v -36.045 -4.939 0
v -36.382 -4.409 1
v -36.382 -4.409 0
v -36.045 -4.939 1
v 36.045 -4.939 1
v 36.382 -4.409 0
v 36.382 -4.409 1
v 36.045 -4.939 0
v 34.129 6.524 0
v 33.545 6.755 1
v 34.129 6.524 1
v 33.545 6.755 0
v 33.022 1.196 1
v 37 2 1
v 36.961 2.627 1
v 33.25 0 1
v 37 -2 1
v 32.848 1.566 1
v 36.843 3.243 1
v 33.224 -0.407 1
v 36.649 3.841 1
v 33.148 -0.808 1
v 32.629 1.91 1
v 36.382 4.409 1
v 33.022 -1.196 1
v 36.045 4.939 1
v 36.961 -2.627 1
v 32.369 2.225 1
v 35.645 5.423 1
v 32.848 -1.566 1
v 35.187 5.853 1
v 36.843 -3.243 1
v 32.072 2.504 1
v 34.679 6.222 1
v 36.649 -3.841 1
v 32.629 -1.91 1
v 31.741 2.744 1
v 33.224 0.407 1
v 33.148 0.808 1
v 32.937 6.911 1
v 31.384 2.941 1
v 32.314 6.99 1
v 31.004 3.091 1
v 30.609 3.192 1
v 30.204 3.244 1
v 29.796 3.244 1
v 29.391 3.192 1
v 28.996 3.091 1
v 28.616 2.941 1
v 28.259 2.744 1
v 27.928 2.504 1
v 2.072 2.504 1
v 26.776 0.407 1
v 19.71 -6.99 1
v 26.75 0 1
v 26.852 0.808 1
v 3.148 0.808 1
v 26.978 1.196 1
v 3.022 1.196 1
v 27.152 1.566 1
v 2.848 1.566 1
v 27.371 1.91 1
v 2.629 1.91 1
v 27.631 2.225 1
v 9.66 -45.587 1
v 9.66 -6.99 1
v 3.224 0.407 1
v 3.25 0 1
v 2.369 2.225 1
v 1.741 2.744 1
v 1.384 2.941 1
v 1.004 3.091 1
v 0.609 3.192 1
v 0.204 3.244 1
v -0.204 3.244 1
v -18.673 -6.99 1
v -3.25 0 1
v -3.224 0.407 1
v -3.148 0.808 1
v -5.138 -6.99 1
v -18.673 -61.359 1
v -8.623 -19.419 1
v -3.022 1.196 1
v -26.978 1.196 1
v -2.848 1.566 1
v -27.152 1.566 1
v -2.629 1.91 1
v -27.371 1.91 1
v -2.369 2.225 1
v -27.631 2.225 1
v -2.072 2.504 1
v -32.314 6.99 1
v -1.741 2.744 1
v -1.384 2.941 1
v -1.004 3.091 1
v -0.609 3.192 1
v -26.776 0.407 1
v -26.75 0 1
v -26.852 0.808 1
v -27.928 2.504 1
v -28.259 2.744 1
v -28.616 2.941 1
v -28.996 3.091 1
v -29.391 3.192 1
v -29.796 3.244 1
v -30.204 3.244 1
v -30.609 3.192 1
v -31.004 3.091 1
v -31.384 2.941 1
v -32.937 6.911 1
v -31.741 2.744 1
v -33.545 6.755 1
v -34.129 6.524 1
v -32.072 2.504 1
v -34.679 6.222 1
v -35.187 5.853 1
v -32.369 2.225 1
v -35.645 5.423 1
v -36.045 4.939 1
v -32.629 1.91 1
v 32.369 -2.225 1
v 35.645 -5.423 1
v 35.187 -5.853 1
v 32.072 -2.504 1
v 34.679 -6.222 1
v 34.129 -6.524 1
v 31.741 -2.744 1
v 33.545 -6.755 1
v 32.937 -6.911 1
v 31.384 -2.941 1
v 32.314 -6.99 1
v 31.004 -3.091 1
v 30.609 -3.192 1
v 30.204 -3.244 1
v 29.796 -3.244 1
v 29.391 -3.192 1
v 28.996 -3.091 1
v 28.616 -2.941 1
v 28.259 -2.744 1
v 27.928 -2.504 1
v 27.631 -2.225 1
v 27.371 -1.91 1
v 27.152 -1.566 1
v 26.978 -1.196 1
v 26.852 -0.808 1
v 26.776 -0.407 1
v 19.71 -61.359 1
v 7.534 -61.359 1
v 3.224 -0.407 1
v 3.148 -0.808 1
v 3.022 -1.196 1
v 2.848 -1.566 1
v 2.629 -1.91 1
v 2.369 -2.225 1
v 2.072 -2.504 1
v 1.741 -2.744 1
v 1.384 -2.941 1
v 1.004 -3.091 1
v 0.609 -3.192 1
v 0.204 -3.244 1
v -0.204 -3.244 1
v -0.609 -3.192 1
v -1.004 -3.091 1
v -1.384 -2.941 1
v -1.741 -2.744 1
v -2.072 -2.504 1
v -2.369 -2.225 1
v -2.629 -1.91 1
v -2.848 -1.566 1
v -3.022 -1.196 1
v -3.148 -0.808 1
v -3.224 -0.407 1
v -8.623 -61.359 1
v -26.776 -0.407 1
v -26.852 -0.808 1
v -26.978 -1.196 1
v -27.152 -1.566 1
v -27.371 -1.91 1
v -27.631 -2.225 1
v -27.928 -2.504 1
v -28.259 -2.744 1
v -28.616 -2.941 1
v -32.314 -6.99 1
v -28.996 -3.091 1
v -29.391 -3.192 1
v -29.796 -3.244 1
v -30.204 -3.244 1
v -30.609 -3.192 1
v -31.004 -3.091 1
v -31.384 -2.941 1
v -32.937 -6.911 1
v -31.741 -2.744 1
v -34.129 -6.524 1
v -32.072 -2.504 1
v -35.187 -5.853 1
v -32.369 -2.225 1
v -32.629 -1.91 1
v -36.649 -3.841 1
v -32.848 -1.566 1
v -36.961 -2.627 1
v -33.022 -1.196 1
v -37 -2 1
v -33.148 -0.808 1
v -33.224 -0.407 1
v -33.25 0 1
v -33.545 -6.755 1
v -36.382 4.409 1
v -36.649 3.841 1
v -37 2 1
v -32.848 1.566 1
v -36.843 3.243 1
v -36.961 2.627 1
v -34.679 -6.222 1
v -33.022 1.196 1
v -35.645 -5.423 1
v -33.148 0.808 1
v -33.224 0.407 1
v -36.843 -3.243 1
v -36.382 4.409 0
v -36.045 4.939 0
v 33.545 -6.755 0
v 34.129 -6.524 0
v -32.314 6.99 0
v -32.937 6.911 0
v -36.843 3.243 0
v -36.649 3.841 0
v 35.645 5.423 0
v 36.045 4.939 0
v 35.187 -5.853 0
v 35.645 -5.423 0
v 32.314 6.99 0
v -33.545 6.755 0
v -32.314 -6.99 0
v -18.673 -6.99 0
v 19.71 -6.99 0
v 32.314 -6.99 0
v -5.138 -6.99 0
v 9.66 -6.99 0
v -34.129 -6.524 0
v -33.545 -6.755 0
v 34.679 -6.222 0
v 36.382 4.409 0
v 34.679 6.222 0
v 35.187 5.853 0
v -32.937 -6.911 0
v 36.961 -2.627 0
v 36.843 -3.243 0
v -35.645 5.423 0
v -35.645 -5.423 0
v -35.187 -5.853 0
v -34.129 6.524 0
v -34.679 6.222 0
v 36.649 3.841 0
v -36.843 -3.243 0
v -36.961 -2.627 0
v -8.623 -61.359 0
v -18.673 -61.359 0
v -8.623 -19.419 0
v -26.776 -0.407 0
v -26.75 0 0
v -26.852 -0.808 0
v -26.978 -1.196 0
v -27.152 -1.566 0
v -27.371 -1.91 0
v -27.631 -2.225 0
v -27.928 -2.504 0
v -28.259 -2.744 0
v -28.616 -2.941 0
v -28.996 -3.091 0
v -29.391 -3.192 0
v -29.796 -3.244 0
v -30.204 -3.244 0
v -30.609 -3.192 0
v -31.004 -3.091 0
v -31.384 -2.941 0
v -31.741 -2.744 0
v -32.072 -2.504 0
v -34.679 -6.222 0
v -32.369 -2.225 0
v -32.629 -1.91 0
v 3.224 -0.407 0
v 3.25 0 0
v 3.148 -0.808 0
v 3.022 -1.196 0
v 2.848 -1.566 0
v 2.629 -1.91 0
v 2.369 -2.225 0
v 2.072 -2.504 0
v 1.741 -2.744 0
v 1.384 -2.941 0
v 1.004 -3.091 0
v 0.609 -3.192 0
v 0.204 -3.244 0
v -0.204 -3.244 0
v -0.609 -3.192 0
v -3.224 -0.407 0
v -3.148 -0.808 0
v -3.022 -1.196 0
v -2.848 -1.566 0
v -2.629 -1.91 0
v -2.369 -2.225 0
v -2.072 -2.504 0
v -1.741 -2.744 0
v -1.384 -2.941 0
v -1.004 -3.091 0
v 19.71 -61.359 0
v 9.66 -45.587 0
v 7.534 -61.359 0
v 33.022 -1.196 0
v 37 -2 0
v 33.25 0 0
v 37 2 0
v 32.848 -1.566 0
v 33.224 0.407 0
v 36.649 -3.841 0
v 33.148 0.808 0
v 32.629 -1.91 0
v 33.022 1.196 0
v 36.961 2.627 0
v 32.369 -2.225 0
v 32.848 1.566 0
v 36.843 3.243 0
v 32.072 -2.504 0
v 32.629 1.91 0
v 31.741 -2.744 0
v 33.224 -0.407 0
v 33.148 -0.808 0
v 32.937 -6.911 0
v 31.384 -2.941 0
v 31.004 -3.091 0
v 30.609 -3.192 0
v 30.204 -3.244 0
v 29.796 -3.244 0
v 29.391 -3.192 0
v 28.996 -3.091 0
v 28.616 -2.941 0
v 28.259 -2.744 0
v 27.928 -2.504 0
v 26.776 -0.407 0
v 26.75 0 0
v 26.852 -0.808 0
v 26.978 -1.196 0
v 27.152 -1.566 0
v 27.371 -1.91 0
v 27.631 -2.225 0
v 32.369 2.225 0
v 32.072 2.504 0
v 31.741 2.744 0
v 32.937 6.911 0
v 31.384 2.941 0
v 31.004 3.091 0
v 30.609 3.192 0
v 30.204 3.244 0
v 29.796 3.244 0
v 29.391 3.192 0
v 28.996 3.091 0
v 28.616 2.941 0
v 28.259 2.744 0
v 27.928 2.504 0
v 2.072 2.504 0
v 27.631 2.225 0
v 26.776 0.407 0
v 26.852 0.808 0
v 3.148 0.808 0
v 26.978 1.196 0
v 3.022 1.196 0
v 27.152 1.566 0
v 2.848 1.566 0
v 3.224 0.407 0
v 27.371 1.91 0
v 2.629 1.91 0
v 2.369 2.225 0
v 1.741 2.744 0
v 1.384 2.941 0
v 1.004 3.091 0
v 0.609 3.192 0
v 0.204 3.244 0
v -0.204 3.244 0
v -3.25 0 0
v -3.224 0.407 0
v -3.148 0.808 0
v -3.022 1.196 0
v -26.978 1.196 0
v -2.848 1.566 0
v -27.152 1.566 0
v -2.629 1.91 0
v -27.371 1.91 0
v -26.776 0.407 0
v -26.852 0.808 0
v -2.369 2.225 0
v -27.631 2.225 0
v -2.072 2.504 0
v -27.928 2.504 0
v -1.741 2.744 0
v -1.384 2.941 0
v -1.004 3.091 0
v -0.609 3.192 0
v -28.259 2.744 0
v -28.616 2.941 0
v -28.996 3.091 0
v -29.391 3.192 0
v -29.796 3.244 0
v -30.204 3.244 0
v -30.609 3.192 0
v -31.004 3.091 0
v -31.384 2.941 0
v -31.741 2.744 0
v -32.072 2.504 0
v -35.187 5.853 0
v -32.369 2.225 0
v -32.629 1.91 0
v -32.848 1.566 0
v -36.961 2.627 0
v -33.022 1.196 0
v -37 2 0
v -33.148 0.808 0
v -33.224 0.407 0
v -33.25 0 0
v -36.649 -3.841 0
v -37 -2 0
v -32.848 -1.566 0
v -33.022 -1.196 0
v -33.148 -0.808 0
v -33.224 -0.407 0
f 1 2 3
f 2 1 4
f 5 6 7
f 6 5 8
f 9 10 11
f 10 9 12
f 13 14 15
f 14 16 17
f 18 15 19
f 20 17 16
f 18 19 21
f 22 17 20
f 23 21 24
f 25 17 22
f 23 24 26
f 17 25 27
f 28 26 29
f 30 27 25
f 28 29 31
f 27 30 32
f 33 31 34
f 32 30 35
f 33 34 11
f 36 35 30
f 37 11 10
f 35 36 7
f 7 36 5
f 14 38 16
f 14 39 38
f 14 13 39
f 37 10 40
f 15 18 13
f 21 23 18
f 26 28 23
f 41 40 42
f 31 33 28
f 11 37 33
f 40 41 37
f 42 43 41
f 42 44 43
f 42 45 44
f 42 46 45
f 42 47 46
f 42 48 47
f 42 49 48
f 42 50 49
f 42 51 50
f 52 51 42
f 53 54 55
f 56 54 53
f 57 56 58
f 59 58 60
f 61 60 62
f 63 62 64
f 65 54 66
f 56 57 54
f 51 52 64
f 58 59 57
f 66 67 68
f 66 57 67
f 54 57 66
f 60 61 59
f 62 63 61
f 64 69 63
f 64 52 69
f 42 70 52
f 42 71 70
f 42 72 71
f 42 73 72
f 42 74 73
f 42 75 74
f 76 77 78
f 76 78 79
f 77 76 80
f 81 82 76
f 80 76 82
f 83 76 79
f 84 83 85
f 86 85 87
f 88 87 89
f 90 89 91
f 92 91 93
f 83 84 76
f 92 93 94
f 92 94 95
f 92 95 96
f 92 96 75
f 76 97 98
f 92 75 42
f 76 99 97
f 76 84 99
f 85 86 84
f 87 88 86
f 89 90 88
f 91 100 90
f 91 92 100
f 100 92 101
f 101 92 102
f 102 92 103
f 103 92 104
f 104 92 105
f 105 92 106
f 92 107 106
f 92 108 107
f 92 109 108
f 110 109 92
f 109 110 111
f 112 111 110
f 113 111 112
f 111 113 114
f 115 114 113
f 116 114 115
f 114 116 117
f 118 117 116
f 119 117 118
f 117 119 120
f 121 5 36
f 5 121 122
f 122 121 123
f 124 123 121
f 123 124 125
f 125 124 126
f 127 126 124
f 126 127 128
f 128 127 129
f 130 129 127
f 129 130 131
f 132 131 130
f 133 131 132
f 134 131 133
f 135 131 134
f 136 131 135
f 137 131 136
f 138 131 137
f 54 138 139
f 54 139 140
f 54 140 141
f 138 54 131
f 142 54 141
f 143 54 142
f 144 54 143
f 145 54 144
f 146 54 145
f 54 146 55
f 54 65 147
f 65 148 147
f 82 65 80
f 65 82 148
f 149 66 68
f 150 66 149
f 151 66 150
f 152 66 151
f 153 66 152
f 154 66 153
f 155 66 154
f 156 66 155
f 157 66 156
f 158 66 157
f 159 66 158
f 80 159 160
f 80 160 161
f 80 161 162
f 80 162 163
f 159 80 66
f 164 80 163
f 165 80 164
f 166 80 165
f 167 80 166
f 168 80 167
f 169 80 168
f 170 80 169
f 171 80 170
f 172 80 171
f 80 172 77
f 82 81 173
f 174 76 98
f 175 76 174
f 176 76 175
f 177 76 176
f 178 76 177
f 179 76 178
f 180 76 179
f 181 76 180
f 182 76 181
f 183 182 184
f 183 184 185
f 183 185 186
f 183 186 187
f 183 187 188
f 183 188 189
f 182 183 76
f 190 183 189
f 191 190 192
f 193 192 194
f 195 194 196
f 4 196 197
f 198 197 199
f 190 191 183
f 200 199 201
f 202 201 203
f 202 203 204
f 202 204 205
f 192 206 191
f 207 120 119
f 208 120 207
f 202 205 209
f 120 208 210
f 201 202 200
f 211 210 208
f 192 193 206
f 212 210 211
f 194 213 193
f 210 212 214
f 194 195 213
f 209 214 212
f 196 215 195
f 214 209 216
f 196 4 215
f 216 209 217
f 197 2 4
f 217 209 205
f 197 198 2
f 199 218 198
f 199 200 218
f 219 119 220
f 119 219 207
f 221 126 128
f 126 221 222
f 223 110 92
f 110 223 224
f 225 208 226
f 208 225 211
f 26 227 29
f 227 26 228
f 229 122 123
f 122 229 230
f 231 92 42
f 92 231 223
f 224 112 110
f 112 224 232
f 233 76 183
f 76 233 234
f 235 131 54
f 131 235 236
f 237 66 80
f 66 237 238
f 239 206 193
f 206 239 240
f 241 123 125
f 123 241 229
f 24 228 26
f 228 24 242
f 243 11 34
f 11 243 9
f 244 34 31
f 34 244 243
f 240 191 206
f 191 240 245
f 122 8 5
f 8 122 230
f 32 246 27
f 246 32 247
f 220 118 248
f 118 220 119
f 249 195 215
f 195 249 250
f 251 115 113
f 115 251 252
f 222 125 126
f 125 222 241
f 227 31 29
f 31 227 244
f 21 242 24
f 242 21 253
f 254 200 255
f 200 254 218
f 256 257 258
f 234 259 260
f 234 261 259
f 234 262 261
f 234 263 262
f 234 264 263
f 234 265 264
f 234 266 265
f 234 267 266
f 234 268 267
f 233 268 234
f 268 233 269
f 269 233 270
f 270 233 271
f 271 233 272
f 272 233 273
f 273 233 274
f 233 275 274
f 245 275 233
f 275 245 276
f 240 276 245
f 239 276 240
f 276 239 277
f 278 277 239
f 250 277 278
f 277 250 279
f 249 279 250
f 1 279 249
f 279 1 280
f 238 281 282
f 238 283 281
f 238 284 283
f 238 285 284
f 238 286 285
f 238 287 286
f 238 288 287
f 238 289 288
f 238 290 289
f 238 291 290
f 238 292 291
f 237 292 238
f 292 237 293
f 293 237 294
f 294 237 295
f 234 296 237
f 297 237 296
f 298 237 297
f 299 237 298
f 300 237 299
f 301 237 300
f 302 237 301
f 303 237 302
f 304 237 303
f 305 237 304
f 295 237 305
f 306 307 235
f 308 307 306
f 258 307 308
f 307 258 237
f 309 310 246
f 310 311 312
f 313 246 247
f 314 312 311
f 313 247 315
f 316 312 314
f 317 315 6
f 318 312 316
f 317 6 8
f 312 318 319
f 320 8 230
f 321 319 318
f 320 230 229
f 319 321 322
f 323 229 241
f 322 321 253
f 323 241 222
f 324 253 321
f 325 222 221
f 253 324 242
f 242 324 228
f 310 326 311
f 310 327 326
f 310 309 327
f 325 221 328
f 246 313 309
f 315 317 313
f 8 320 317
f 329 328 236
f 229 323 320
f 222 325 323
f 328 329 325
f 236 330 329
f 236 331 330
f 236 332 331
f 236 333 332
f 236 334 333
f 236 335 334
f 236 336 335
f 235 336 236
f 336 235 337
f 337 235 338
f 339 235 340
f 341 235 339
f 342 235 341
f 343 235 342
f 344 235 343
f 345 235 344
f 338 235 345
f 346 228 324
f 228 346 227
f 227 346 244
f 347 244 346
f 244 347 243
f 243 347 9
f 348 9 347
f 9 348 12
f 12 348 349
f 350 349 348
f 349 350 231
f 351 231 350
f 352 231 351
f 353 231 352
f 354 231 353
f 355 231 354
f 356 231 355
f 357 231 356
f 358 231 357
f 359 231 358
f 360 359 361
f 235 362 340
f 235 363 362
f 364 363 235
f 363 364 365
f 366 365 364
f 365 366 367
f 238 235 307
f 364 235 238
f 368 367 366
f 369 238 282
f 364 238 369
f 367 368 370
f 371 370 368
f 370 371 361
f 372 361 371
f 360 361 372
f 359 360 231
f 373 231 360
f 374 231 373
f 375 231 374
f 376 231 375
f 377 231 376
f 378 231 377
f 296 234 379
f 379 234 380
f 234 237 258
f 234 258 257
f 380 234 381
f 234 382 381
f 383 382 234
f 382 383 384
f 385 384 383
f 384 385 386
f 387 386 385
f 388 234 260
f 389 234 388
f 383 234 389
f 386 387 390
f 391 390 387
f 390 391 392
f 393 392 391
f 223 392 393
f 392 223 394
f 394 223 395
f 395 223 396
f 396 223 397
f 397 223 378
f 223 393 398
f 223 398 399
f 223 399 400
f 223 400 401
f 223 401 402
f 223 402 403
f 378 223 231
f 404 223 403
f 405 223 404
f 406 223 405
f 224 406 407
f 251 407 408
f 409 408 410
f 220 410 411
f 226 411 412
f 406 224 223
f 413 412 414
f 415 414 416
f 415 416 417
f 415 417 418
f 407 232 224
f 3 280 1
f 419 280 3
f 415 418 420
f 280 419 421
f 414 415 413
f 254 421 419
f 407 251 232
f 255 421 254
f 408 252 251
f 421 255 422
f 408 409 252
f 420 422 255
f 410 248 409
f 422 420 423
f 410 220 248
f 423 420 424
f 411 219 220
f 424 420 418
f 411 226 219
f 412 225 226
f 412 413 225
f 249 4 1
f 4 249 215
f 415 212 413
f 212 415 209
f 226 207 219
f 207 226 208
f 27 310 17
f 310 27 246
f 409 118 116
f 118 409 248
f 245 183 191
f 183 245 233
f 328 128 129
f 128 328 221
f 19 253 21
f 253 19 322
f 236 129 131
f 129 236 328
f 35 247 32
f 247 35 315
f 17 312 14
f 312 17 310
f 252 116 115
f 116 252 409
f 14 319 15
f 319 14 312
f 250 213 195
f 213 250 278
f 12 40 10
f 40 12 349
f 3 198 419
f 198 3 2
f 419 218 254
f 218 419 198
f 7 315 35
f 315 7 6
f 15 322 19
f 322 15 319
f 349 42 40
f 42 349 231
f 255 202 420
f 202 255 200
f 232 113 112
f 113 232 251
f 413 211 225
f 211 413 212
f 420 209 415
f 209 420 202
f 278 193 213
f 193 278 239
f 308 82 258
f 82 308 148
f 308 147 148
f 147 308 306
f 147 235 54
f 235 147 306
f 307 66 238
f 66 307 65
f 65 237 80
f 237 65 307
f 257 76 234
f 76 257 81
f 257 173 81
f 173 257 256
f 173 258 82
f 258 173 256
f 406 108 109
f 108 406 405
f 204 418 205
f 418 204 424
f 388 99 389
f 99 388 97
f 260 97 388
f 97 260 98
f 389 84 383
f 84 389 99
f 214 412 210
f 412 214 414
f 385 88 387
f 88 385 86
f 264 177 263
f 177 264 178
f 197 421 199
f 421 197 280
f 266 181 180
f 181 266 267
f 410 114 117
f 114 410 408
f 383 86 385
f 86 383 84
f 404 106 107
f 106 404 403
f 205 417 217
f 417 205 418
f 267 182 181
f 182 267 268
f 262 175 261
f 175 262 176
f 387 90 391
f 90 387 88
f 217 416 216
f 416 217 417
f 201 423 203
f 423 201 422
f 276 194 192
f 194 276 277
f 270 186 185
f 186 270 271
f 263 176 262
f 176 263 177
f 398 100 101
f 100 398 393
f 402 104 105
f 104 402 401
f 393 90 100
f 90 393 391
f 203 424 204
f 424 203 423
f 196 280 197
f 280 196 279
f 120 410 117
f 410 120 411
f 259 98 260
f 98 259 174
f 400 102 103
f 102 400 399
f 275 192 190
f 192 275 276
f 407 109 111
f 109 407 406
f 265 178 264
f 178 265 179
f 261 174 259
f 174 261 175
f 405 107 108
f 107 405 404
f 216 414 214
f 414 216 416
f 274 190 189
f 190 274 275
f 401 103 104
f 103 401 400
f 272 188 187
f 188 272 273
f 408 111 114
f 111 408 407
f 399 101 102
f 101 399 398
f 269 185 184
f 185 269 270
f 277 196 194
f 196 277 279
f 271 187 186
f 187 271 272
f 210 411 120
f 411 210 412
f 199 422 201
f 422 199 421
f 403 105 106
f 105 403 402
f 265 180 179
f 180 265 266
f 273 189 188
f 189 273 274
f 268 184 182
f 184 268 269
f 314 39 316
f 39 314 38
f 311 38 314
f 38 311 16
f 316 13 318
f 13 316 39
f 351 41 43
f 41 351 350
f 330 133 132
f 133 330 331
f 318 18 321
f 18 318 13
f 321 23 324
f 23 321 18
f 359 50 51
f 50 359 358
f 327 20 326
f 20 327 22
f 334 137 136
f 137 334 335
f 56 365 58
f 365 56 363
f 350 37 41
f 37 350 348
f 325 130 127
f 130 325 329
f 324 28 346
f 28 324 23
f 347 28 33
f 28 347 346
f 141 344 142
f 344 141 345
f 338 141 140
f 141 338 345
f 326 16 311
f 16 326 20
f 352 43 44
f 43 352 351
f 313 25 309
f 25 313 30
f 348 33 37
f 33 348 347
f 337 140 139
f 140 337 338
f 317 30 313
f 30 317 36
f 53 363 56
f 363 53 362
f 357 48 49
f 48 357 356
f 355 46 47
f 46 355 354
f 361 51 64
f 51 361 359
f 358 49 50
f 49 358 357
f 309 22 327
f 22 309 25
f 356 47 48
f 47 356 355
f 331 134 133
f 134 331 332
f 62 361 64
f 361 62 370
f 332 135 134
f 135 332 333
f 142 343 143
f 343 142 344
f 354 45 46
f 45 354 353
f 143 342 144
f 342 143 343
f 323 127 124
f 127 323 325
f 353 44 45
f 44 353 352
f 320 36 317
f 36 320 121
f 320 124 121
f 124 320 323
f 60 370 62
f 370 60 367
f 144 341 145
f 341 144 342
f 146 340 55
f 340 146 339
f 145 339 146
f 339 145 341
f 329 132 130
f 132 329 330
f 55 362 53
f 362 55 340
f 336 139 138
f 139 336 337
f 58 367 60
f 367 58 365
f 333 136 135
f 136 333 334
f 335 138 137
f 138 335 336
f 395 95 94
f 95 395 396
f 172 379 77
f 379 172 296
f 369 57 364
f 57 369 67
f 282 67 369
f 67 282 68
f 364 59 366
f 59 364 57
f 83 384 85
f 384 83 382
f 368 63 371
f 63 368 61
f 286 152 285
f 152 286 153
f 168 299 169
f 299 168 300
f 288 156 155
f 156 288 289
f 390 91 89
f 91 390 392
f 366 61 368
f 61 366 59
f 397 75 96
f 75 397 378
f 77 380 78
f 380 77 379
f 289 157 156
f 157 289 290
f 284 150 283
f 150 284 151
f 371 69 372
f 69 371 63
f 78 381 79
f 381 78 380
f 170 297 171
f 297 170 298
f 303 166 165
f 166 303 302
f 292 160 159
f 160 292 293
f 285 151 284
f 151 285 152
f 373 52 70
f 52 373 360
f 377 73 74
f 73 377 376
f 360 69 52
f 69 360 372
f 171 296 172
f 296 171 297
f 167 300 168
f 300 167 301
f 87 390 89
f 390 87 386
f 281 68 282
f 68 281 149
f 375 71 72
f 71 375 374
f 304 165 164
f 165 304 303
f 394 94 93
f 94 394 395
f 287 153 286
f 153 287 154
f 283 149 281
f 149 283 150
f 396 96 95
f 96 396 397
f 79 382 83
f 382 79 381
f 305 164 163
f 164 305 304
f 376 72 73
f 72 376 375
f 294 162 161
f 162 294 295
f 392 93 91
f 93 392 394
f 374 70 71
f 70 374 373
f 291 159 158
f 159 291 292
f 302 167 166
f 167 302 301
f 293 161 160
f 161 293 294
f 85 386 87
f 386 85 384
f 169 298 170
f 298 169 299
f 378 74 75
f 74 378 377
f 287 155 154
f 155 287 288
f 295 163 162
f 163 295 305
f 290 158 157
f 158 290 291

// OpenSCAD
$fn = 50;


difference() {
	union() {
		translate(v = [0, 0, 0]) {
			rotate(a = [0, 0, 0]) {
				hull() {
					translate(v = [-32.0000000000, 2.0000000000, 0]) {
						rotate(a = [0, 0, 0]) {
							translate(v = [0, 0, 0]) {
								rotate(a = [0, 0, 0]) {
									cylinder(h = 1, r = 5);
								}
							}
						}
					}
					translate(v = [32.0000000000, 2.0000000000, 0]) {
						rotate(a = [0, 0, 0]) {
							translate(v = [0, 0, 0]) {
								rotate(a = [0, 0, 0]) {
									cylinder(h = 1, r = 5);
								}
							}
						}
					}
					translate(v = [-32.0000000000, -2.0000000000, 0]) {
						rotate(a = [0, 0, 0]) {
							translate(v = [0, 0, 0]) {
								rotate(a = [0, 0, 0]) {
									cylinder(h = 1, r = 5);
								}
							}
						}
					}
					translate(v = [32.0000000000, -2.0000000000, 0]) {
						rotate(a = [0, 0, 0]) {
							translate(v = [0, 0, 0]) {
								rotate(a = [0, 0, 0]) {
									cylinder(h = 1, r = 5);
								}
							}
						}
					}
				}
			}
		}
		translate(v = [0, -5, 0]) {
			rotate(a = [0, 0, 0]) {
				linear_extrude(height = 1) {
					text(font = "DejaVu Sans Mono:style=Bold", halign = "center", size = 57.0000000000, text = "N", valign = "top");
				}
			}
		}
	}
	union() {
		translate(v = [-30.0000000000, 0.0000000000, -125.0000000000]) {
			rotate(a = [0, 0, 0]) {
				cylinder(h = 250, r = 3.2500000000);
			}
		}
		translate(v = [30.0000000000, 0.0000000000, -125.0000000000]) {
			rotate(a = [0, 0, 0]) {
				cylinder(h = 250, r = 3.2500000000);
			}
		}
		translate(v = [30.0000000000, 0.0000000000, -125.0000000000]) {
			rotate(a = [0, 0, 0]) {
				cylinder(h = 250, r = 3.2500000000);
			}
		}
		translate(v = [0, 0, -125.0000000000]) {
			rotate(a = [0, 0, 0]) {
				cylinder(h = 250, r = 3.2500000000);
			}
		}
	}
}
